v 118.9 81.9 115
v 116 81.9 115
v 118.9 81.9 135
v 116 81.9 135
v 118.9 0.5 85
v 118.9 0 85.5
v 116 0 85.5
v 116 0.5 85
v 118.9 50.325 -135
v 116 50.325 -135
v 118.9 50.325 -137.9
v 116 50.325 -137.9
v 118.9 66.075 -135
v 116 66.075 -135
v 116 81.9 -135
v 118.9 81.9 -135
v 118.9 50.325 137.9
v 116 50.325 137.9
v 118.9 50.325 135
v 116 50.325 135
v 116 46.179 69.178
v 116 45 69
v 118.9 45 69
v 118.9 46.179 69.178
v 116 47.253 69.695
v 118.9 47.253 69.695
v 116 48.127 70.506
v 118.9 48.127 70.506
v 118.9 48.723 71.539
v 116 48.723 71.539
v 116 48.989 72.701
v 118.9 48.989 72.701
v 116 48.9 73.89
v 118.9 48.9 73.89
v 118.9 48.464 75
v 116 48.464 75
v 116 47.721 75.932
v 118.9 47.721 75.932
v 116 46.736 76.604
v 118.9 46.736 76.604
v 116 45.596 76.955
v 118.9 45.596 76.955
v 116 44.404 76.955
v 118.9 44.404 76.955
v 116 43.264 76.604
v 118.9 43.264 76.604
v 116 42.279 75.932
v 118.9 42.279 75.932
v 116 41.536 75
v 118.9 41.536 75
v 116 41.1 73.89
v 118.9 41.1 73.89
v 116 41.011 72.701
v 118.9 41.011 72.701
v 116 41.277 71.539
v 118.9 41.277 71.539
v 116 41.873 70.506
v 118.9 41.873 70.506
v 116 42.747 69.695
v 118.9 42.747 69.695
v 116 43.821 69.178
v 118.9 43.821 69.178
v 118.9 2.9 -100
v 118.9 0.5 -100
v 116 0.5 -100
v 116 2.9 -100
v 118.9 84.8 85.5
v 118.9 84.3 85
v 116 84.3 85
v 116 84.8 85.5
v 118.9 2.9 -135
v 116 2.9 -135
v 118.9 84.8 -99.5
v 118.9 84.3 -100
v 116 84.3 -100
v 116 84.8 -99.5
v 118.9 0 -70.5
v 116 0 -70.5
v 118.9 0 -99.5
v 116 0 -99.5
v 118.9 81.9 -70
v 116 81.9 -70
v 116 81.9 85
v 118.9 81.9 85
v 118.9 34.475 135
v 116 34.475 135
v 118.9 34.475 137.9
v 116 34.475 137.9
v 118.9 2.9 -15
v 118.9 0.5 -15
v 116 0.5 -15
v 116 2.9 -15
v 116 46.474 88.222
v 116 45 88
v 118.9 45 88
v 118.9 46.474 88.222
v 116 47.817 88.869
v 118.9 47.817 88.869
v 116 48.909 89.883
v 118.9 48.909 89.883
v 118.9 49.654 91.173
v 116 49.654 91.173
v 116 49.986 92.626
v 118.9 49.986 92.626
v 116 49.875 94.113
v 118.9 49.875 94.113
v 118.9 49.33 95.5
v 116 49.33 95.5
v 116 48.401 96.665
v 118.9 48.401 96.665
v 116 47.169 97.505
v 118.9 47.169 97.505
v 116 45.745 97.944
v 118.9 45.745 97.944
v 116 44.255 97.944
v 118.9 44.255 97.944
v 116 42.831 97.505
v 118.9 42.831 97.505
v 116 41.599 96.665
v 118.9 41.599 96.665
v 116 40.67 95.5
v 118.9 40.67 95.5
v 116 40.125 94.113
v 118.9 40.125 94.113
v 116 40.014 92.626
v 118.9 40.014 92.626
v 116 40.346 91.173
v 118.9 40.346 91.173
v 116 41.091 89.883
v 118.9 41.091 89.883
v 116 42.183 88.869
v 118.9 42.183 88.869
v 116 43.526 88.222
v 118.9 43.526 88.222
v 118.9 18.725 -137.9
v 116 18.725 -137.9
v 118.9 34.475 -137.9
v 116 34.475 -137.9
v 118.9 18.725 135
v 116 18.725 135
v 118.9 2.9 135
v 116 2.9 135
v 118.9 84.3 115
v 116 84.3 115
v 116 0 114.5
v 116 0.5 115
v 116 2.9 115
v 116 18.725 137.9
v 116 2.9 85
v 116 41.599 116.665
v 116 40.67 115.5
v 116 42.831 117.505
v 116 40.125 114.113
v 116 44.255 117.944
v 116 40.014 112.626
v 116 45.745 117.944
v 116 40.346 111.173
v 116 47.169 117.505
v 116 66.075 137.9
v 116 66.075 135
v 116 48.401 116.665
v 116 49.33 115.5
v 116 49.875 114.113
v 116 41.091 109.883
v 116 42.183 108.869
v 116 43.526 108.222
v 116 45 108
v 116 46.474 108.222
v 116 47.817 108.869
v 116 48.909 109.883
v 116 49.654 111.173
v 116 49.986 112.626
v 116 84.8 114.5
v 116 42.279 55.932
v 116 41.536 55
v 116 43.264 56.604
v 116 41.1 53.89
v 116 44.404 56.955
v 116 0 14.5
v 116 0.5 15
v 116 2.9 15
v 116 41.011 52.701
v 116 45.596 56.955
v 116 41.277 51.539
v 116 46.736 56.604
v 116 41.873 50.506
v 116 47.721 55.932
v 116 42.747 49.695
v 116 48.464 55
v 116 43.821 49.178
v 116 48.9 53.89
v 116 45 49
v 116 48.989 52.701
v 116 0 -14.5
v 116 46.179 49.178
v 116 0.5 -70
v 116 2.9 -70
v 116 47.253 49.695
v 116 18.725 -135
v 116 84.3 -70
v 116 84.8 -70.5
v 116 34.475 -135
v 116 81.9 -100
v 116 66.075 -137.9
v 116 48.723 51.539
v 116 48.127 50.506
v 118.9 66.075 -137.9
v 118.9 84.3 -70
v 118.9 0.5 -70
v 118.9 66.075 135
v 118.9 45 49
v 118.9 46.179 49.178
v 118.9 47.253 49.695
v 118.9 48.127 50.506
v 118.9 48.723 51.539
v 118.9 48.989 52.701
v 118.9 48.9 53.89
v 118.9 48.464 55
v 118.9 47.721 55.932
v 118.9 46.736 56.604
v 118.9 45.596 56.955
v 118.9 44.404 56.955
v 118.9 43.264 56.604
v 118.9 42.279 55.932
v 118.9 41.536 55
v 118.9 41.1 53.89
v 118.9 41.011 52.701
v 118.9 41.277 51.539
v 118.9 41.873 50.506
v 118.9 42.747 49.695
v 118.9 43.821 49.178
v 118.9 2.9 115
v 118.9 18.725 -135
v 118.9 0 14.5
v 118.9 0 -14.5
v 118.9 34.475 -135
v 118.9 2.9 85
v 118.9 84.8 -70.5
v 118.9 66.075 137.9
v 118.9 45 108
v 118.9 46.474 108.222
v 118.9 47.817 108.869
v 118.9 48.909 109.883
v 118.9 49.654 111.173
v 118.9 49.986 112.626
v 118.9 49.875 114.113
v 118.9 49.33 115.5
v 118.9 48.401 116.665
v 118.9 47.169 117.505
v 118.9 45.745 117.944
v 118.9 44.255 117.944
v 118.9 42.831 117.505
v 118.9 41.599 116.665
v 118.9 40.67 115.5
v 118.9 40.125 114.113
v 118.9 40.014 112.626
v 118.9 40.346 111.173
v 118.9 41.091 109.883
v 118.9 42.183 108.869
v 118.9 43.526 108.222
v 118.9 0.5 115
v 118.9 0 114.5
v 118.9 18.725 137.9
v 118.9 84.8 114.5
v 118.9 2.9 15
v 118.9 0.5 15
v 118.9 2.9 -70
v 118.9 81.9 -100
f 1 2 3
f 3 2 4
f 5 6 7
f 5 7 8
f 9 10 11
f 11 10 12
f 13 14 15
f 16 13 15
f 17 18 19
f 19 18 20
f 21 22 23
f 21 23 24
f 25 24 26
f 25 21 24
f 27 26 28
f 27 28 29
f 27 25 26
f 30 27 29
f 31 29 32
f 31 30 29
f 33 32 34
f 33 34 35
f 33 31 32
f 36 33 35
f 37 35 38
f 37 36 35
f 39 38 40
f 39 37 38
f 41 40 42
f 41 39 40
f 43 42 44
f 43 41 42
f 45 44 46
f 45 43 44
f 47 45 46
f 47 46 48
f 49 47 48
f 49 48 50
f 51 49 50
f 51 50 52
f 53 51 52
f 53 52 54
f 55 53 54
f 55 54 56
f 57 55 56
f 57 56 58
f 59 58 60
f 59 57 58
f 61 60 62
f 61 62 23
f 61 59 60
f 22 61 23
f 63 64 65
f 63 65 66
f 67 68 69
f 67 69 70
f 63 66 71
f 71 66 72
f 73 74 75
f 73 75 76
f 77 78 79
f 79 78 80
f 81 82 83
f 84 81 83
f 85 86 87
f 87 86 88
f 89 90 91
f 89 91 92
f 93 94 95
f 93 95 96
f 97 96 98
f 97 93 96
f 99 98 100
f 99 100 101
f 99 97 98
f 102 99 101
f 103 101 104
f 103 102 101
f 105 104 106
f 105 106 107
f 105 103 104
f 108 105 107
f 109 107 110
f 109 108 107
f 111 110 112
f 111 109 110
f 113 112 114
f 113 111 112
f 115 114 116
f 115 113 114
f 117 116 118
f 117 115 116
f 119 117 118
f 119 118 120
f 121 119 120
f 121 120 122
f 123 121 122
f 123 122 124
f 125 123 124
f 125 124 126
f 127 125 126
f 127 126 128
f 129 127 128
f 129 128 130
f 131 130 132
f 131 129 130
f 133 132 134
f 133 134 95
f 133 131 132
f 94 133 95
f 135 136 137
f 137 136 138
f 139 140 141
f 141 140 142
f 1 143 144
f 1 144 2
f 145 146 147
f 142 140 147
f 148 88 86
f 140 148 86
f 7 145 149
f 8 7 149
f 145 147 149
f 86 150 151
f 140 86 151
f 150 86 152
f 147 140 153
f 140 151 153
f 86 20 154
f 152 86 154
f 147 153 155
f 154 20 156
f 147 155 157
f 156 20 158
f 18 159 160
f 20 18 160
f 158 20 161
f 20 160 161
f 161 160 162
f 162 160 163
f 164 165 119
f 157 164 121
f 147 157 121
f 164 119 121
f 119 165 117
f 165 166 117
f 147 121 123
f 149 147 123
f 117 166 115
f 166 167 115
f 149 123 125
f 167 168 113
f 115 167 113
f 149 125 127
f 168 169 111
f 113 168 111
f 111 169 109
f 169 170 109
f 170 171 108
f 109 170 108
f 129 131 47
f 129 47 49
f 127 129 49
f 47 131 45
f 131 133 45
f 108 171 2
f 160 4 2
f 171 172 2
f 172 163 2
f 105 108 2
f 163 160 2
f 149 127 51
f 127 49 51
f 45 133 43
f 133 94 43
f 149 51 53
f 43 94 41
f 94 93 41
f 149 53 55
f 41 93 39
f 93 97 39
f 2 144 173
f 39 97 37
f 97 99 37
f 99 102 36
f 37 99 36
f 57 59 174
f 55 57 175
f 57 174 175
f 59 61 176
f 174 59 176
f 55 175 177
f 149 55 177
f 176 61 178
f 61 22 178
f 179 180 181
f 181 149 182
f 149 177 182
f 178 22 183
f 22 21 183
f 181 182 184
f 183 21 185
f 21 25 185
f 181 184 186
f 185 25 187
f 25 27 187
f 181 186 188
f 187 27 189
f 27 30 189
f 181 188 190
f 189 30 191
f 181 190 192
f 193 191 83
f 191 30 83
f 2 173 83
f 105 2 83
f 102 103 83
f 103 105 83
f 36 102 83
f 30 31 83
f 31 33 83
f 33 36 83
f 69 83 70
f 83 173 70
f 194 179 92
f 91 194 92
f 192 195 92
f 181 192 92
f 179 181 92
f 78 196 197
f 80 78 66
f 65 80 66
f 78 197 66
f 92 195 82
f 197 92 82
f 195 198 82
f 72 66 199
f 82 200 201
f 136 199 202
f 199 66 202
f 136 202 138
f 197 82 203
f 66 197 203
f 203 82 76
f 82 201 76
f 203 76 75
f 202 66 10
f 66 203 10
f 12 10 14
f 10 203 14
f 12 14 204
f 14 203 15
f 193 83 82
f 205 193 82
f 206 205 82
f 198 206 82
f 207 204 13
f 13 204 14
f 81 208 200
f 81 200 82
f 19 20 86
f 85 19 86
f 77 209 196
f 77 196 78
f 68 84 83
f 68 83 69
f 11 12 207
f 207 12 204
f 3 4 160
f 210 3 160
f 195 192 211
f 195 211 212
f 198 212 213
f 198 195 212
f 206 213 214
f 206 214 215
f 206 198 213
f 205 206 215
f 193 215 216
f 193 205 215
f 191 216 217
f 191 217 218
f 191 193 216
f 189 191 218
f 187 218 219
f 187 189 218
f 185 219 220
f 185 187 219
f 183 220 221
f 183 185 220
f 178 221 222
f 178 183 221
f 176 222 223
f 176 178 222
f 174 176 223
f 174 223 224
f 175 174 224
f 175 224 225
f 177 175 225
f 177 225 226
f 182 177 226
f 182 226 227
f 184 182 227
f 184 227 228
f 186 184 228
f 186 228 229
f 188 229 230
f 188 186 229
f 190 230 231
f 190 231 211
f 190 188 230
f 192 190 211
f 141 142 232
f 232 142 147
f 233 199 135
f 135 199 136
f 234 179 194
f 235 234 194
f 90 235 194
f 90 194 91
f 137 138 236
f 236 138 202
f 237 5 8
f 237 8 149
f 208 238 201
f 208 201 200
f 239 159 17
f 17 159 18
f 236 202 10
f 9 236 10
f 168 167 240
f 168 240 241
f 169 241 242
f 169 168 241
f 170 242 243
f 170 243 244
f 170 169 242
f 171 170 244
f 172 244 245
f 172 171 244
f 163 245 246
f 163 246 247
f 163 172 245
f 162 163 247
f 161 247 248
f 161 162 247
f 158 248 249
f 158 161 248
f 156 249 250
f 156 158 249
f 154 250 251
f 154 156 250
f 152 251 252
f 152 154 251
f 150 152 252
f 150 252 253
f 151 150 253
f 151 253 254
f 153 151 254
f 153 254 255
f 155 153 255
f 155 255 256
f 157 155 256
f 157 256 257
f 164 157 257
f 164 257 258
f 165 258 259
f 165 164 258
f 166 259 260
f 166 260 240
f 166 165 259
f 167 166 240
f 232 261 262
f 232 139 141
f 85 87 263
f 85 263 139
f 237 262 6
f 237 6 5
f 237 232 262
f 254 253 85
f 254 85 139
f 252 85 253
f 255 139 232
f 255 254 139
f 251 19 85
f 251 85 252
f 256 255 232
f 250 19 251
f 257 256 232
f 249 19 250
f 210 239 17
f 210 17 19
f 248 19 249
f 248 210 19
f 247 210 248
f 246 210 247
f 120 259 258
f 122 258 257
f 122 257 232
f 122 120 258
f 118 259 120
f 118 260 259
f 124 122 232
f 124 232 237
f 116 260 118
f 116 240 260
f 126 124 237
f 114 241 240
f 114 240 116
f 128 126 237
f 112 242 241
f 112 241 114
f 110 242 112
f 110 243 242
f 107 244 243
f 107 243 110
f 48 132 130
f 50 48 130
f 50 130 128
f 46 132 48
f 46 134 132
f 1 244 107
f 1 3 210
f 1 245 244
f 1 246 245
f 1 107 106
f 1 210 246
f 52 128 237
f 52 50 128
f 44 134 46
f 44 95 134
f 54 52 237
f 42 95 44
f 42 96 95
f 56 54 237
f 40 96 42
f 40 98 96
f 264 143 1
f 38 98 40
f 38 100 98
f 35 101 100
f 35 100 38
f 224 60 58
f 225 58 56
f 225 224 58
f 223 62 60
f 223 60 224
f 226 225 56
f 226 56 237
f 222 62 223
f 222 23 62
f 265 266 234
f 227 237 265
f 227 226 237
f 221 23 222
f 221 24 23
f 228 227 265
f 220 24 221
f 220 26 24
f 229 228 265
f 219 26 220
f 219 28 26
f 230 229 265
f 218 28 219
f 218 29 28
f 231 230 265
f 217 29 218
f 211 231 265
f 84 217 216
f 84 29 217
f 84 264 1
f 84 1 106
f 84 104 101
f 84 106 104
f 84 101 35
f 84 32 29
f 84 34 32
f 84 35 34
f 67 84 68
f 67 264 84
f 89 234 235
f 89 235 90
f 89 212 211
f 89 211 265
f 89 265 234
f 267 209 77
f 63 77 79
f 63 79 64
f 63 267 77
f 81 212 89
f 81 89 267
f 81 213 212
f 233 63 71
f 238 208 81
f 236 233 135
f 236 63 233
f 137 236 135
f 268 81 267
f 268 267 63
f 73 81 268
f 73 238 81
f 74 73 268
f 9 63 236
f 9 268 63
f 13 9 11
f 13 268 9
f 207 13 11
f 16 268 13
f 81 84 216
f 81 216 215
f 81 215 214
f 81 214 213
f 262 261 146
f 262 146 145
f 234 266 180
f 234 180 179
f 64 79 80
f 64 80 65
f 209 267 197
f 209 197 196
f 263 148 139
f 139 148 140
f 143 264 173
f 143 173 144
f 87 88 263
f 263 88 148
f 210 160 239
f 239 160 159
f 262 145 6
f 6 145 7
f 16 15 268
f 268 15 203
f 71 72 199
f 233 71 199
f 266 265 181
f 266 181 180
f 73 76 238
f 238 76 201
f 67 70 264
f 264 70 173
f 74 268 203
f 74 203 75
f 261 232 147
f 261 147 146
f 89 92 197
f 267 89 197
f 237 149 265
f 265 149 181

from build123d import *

# Parameters (mm, degrees)
SKETCH1_R           = 5
SKETCH1_R_2         = 4
BOSS_EXTRUDE1_DEPTH = 2.9


with BuildPart() as part:
    # Sketch1 → Boss-Extrude1 (new body)
    with BuildSketch(Plane(origin=(116, 0, 0), x_dir=(0, 0, -1), z_dir=(1, 0, 0))):
        Polygon((-135, 2.9), (-115, 2.9), (-115, 0.5), (-114.5, 0), (-85.5, 0), (-85, 0.5), (-85, 2.9), (-15, 2.9), (-15, 0.5), (-14.5, 0), (14.5, 0), (15, 0.5), (15, 2.9), (70, 2.9), (70, 0.5), (70.5, 0), (99.5, 0), (100, 0.5), (100, 2.9), (135, 2.9), (135, 18.725), (137.9, 18.725), (137.9, 34.475), (135, 34.475), (135, 50.325), (137.9, 50.325), (137.9, 66.075), (135, 66.075), (135, 81.9), (100, 81.9), (100, 84.3), (99.5, 84.8), (70.5, 84.8), (70, 84.3), (70, 81.9), (-85, 81.9), (-85, 84.3), (-85.5, 84.8), (-114.5, 84.8), (-115, 84.3), (-115, 81.9), (-135, 81.9), (-135, 66.075), (-137.9, 66.075), (-137.9, 50.325), (-135, 50.325), (-135, 34.475), (-137.9, 34.475), (-137.9, 18.725), (-135, 18.725), align=None)
        with Locations((-113, 45)):
            Circle(SKETCH1_R, mode=Mode.SUBTRACT)
        with Locations((-93, 45)):
            Circle(SKETCH1_R, mode=Mode.SUBTRACT)
        with Locations((-73, 45)):
            Circle(SKETCH1_R_2, mode=Mode.SUBTRACT)
        with Locations((-53, 45)):
            Circle(SKETCH1_R_2, mode=Mode.SUBTRACT)
    extrude(amount=BOSS_EXTRUDE1_DEPTH)


solid = part.part
